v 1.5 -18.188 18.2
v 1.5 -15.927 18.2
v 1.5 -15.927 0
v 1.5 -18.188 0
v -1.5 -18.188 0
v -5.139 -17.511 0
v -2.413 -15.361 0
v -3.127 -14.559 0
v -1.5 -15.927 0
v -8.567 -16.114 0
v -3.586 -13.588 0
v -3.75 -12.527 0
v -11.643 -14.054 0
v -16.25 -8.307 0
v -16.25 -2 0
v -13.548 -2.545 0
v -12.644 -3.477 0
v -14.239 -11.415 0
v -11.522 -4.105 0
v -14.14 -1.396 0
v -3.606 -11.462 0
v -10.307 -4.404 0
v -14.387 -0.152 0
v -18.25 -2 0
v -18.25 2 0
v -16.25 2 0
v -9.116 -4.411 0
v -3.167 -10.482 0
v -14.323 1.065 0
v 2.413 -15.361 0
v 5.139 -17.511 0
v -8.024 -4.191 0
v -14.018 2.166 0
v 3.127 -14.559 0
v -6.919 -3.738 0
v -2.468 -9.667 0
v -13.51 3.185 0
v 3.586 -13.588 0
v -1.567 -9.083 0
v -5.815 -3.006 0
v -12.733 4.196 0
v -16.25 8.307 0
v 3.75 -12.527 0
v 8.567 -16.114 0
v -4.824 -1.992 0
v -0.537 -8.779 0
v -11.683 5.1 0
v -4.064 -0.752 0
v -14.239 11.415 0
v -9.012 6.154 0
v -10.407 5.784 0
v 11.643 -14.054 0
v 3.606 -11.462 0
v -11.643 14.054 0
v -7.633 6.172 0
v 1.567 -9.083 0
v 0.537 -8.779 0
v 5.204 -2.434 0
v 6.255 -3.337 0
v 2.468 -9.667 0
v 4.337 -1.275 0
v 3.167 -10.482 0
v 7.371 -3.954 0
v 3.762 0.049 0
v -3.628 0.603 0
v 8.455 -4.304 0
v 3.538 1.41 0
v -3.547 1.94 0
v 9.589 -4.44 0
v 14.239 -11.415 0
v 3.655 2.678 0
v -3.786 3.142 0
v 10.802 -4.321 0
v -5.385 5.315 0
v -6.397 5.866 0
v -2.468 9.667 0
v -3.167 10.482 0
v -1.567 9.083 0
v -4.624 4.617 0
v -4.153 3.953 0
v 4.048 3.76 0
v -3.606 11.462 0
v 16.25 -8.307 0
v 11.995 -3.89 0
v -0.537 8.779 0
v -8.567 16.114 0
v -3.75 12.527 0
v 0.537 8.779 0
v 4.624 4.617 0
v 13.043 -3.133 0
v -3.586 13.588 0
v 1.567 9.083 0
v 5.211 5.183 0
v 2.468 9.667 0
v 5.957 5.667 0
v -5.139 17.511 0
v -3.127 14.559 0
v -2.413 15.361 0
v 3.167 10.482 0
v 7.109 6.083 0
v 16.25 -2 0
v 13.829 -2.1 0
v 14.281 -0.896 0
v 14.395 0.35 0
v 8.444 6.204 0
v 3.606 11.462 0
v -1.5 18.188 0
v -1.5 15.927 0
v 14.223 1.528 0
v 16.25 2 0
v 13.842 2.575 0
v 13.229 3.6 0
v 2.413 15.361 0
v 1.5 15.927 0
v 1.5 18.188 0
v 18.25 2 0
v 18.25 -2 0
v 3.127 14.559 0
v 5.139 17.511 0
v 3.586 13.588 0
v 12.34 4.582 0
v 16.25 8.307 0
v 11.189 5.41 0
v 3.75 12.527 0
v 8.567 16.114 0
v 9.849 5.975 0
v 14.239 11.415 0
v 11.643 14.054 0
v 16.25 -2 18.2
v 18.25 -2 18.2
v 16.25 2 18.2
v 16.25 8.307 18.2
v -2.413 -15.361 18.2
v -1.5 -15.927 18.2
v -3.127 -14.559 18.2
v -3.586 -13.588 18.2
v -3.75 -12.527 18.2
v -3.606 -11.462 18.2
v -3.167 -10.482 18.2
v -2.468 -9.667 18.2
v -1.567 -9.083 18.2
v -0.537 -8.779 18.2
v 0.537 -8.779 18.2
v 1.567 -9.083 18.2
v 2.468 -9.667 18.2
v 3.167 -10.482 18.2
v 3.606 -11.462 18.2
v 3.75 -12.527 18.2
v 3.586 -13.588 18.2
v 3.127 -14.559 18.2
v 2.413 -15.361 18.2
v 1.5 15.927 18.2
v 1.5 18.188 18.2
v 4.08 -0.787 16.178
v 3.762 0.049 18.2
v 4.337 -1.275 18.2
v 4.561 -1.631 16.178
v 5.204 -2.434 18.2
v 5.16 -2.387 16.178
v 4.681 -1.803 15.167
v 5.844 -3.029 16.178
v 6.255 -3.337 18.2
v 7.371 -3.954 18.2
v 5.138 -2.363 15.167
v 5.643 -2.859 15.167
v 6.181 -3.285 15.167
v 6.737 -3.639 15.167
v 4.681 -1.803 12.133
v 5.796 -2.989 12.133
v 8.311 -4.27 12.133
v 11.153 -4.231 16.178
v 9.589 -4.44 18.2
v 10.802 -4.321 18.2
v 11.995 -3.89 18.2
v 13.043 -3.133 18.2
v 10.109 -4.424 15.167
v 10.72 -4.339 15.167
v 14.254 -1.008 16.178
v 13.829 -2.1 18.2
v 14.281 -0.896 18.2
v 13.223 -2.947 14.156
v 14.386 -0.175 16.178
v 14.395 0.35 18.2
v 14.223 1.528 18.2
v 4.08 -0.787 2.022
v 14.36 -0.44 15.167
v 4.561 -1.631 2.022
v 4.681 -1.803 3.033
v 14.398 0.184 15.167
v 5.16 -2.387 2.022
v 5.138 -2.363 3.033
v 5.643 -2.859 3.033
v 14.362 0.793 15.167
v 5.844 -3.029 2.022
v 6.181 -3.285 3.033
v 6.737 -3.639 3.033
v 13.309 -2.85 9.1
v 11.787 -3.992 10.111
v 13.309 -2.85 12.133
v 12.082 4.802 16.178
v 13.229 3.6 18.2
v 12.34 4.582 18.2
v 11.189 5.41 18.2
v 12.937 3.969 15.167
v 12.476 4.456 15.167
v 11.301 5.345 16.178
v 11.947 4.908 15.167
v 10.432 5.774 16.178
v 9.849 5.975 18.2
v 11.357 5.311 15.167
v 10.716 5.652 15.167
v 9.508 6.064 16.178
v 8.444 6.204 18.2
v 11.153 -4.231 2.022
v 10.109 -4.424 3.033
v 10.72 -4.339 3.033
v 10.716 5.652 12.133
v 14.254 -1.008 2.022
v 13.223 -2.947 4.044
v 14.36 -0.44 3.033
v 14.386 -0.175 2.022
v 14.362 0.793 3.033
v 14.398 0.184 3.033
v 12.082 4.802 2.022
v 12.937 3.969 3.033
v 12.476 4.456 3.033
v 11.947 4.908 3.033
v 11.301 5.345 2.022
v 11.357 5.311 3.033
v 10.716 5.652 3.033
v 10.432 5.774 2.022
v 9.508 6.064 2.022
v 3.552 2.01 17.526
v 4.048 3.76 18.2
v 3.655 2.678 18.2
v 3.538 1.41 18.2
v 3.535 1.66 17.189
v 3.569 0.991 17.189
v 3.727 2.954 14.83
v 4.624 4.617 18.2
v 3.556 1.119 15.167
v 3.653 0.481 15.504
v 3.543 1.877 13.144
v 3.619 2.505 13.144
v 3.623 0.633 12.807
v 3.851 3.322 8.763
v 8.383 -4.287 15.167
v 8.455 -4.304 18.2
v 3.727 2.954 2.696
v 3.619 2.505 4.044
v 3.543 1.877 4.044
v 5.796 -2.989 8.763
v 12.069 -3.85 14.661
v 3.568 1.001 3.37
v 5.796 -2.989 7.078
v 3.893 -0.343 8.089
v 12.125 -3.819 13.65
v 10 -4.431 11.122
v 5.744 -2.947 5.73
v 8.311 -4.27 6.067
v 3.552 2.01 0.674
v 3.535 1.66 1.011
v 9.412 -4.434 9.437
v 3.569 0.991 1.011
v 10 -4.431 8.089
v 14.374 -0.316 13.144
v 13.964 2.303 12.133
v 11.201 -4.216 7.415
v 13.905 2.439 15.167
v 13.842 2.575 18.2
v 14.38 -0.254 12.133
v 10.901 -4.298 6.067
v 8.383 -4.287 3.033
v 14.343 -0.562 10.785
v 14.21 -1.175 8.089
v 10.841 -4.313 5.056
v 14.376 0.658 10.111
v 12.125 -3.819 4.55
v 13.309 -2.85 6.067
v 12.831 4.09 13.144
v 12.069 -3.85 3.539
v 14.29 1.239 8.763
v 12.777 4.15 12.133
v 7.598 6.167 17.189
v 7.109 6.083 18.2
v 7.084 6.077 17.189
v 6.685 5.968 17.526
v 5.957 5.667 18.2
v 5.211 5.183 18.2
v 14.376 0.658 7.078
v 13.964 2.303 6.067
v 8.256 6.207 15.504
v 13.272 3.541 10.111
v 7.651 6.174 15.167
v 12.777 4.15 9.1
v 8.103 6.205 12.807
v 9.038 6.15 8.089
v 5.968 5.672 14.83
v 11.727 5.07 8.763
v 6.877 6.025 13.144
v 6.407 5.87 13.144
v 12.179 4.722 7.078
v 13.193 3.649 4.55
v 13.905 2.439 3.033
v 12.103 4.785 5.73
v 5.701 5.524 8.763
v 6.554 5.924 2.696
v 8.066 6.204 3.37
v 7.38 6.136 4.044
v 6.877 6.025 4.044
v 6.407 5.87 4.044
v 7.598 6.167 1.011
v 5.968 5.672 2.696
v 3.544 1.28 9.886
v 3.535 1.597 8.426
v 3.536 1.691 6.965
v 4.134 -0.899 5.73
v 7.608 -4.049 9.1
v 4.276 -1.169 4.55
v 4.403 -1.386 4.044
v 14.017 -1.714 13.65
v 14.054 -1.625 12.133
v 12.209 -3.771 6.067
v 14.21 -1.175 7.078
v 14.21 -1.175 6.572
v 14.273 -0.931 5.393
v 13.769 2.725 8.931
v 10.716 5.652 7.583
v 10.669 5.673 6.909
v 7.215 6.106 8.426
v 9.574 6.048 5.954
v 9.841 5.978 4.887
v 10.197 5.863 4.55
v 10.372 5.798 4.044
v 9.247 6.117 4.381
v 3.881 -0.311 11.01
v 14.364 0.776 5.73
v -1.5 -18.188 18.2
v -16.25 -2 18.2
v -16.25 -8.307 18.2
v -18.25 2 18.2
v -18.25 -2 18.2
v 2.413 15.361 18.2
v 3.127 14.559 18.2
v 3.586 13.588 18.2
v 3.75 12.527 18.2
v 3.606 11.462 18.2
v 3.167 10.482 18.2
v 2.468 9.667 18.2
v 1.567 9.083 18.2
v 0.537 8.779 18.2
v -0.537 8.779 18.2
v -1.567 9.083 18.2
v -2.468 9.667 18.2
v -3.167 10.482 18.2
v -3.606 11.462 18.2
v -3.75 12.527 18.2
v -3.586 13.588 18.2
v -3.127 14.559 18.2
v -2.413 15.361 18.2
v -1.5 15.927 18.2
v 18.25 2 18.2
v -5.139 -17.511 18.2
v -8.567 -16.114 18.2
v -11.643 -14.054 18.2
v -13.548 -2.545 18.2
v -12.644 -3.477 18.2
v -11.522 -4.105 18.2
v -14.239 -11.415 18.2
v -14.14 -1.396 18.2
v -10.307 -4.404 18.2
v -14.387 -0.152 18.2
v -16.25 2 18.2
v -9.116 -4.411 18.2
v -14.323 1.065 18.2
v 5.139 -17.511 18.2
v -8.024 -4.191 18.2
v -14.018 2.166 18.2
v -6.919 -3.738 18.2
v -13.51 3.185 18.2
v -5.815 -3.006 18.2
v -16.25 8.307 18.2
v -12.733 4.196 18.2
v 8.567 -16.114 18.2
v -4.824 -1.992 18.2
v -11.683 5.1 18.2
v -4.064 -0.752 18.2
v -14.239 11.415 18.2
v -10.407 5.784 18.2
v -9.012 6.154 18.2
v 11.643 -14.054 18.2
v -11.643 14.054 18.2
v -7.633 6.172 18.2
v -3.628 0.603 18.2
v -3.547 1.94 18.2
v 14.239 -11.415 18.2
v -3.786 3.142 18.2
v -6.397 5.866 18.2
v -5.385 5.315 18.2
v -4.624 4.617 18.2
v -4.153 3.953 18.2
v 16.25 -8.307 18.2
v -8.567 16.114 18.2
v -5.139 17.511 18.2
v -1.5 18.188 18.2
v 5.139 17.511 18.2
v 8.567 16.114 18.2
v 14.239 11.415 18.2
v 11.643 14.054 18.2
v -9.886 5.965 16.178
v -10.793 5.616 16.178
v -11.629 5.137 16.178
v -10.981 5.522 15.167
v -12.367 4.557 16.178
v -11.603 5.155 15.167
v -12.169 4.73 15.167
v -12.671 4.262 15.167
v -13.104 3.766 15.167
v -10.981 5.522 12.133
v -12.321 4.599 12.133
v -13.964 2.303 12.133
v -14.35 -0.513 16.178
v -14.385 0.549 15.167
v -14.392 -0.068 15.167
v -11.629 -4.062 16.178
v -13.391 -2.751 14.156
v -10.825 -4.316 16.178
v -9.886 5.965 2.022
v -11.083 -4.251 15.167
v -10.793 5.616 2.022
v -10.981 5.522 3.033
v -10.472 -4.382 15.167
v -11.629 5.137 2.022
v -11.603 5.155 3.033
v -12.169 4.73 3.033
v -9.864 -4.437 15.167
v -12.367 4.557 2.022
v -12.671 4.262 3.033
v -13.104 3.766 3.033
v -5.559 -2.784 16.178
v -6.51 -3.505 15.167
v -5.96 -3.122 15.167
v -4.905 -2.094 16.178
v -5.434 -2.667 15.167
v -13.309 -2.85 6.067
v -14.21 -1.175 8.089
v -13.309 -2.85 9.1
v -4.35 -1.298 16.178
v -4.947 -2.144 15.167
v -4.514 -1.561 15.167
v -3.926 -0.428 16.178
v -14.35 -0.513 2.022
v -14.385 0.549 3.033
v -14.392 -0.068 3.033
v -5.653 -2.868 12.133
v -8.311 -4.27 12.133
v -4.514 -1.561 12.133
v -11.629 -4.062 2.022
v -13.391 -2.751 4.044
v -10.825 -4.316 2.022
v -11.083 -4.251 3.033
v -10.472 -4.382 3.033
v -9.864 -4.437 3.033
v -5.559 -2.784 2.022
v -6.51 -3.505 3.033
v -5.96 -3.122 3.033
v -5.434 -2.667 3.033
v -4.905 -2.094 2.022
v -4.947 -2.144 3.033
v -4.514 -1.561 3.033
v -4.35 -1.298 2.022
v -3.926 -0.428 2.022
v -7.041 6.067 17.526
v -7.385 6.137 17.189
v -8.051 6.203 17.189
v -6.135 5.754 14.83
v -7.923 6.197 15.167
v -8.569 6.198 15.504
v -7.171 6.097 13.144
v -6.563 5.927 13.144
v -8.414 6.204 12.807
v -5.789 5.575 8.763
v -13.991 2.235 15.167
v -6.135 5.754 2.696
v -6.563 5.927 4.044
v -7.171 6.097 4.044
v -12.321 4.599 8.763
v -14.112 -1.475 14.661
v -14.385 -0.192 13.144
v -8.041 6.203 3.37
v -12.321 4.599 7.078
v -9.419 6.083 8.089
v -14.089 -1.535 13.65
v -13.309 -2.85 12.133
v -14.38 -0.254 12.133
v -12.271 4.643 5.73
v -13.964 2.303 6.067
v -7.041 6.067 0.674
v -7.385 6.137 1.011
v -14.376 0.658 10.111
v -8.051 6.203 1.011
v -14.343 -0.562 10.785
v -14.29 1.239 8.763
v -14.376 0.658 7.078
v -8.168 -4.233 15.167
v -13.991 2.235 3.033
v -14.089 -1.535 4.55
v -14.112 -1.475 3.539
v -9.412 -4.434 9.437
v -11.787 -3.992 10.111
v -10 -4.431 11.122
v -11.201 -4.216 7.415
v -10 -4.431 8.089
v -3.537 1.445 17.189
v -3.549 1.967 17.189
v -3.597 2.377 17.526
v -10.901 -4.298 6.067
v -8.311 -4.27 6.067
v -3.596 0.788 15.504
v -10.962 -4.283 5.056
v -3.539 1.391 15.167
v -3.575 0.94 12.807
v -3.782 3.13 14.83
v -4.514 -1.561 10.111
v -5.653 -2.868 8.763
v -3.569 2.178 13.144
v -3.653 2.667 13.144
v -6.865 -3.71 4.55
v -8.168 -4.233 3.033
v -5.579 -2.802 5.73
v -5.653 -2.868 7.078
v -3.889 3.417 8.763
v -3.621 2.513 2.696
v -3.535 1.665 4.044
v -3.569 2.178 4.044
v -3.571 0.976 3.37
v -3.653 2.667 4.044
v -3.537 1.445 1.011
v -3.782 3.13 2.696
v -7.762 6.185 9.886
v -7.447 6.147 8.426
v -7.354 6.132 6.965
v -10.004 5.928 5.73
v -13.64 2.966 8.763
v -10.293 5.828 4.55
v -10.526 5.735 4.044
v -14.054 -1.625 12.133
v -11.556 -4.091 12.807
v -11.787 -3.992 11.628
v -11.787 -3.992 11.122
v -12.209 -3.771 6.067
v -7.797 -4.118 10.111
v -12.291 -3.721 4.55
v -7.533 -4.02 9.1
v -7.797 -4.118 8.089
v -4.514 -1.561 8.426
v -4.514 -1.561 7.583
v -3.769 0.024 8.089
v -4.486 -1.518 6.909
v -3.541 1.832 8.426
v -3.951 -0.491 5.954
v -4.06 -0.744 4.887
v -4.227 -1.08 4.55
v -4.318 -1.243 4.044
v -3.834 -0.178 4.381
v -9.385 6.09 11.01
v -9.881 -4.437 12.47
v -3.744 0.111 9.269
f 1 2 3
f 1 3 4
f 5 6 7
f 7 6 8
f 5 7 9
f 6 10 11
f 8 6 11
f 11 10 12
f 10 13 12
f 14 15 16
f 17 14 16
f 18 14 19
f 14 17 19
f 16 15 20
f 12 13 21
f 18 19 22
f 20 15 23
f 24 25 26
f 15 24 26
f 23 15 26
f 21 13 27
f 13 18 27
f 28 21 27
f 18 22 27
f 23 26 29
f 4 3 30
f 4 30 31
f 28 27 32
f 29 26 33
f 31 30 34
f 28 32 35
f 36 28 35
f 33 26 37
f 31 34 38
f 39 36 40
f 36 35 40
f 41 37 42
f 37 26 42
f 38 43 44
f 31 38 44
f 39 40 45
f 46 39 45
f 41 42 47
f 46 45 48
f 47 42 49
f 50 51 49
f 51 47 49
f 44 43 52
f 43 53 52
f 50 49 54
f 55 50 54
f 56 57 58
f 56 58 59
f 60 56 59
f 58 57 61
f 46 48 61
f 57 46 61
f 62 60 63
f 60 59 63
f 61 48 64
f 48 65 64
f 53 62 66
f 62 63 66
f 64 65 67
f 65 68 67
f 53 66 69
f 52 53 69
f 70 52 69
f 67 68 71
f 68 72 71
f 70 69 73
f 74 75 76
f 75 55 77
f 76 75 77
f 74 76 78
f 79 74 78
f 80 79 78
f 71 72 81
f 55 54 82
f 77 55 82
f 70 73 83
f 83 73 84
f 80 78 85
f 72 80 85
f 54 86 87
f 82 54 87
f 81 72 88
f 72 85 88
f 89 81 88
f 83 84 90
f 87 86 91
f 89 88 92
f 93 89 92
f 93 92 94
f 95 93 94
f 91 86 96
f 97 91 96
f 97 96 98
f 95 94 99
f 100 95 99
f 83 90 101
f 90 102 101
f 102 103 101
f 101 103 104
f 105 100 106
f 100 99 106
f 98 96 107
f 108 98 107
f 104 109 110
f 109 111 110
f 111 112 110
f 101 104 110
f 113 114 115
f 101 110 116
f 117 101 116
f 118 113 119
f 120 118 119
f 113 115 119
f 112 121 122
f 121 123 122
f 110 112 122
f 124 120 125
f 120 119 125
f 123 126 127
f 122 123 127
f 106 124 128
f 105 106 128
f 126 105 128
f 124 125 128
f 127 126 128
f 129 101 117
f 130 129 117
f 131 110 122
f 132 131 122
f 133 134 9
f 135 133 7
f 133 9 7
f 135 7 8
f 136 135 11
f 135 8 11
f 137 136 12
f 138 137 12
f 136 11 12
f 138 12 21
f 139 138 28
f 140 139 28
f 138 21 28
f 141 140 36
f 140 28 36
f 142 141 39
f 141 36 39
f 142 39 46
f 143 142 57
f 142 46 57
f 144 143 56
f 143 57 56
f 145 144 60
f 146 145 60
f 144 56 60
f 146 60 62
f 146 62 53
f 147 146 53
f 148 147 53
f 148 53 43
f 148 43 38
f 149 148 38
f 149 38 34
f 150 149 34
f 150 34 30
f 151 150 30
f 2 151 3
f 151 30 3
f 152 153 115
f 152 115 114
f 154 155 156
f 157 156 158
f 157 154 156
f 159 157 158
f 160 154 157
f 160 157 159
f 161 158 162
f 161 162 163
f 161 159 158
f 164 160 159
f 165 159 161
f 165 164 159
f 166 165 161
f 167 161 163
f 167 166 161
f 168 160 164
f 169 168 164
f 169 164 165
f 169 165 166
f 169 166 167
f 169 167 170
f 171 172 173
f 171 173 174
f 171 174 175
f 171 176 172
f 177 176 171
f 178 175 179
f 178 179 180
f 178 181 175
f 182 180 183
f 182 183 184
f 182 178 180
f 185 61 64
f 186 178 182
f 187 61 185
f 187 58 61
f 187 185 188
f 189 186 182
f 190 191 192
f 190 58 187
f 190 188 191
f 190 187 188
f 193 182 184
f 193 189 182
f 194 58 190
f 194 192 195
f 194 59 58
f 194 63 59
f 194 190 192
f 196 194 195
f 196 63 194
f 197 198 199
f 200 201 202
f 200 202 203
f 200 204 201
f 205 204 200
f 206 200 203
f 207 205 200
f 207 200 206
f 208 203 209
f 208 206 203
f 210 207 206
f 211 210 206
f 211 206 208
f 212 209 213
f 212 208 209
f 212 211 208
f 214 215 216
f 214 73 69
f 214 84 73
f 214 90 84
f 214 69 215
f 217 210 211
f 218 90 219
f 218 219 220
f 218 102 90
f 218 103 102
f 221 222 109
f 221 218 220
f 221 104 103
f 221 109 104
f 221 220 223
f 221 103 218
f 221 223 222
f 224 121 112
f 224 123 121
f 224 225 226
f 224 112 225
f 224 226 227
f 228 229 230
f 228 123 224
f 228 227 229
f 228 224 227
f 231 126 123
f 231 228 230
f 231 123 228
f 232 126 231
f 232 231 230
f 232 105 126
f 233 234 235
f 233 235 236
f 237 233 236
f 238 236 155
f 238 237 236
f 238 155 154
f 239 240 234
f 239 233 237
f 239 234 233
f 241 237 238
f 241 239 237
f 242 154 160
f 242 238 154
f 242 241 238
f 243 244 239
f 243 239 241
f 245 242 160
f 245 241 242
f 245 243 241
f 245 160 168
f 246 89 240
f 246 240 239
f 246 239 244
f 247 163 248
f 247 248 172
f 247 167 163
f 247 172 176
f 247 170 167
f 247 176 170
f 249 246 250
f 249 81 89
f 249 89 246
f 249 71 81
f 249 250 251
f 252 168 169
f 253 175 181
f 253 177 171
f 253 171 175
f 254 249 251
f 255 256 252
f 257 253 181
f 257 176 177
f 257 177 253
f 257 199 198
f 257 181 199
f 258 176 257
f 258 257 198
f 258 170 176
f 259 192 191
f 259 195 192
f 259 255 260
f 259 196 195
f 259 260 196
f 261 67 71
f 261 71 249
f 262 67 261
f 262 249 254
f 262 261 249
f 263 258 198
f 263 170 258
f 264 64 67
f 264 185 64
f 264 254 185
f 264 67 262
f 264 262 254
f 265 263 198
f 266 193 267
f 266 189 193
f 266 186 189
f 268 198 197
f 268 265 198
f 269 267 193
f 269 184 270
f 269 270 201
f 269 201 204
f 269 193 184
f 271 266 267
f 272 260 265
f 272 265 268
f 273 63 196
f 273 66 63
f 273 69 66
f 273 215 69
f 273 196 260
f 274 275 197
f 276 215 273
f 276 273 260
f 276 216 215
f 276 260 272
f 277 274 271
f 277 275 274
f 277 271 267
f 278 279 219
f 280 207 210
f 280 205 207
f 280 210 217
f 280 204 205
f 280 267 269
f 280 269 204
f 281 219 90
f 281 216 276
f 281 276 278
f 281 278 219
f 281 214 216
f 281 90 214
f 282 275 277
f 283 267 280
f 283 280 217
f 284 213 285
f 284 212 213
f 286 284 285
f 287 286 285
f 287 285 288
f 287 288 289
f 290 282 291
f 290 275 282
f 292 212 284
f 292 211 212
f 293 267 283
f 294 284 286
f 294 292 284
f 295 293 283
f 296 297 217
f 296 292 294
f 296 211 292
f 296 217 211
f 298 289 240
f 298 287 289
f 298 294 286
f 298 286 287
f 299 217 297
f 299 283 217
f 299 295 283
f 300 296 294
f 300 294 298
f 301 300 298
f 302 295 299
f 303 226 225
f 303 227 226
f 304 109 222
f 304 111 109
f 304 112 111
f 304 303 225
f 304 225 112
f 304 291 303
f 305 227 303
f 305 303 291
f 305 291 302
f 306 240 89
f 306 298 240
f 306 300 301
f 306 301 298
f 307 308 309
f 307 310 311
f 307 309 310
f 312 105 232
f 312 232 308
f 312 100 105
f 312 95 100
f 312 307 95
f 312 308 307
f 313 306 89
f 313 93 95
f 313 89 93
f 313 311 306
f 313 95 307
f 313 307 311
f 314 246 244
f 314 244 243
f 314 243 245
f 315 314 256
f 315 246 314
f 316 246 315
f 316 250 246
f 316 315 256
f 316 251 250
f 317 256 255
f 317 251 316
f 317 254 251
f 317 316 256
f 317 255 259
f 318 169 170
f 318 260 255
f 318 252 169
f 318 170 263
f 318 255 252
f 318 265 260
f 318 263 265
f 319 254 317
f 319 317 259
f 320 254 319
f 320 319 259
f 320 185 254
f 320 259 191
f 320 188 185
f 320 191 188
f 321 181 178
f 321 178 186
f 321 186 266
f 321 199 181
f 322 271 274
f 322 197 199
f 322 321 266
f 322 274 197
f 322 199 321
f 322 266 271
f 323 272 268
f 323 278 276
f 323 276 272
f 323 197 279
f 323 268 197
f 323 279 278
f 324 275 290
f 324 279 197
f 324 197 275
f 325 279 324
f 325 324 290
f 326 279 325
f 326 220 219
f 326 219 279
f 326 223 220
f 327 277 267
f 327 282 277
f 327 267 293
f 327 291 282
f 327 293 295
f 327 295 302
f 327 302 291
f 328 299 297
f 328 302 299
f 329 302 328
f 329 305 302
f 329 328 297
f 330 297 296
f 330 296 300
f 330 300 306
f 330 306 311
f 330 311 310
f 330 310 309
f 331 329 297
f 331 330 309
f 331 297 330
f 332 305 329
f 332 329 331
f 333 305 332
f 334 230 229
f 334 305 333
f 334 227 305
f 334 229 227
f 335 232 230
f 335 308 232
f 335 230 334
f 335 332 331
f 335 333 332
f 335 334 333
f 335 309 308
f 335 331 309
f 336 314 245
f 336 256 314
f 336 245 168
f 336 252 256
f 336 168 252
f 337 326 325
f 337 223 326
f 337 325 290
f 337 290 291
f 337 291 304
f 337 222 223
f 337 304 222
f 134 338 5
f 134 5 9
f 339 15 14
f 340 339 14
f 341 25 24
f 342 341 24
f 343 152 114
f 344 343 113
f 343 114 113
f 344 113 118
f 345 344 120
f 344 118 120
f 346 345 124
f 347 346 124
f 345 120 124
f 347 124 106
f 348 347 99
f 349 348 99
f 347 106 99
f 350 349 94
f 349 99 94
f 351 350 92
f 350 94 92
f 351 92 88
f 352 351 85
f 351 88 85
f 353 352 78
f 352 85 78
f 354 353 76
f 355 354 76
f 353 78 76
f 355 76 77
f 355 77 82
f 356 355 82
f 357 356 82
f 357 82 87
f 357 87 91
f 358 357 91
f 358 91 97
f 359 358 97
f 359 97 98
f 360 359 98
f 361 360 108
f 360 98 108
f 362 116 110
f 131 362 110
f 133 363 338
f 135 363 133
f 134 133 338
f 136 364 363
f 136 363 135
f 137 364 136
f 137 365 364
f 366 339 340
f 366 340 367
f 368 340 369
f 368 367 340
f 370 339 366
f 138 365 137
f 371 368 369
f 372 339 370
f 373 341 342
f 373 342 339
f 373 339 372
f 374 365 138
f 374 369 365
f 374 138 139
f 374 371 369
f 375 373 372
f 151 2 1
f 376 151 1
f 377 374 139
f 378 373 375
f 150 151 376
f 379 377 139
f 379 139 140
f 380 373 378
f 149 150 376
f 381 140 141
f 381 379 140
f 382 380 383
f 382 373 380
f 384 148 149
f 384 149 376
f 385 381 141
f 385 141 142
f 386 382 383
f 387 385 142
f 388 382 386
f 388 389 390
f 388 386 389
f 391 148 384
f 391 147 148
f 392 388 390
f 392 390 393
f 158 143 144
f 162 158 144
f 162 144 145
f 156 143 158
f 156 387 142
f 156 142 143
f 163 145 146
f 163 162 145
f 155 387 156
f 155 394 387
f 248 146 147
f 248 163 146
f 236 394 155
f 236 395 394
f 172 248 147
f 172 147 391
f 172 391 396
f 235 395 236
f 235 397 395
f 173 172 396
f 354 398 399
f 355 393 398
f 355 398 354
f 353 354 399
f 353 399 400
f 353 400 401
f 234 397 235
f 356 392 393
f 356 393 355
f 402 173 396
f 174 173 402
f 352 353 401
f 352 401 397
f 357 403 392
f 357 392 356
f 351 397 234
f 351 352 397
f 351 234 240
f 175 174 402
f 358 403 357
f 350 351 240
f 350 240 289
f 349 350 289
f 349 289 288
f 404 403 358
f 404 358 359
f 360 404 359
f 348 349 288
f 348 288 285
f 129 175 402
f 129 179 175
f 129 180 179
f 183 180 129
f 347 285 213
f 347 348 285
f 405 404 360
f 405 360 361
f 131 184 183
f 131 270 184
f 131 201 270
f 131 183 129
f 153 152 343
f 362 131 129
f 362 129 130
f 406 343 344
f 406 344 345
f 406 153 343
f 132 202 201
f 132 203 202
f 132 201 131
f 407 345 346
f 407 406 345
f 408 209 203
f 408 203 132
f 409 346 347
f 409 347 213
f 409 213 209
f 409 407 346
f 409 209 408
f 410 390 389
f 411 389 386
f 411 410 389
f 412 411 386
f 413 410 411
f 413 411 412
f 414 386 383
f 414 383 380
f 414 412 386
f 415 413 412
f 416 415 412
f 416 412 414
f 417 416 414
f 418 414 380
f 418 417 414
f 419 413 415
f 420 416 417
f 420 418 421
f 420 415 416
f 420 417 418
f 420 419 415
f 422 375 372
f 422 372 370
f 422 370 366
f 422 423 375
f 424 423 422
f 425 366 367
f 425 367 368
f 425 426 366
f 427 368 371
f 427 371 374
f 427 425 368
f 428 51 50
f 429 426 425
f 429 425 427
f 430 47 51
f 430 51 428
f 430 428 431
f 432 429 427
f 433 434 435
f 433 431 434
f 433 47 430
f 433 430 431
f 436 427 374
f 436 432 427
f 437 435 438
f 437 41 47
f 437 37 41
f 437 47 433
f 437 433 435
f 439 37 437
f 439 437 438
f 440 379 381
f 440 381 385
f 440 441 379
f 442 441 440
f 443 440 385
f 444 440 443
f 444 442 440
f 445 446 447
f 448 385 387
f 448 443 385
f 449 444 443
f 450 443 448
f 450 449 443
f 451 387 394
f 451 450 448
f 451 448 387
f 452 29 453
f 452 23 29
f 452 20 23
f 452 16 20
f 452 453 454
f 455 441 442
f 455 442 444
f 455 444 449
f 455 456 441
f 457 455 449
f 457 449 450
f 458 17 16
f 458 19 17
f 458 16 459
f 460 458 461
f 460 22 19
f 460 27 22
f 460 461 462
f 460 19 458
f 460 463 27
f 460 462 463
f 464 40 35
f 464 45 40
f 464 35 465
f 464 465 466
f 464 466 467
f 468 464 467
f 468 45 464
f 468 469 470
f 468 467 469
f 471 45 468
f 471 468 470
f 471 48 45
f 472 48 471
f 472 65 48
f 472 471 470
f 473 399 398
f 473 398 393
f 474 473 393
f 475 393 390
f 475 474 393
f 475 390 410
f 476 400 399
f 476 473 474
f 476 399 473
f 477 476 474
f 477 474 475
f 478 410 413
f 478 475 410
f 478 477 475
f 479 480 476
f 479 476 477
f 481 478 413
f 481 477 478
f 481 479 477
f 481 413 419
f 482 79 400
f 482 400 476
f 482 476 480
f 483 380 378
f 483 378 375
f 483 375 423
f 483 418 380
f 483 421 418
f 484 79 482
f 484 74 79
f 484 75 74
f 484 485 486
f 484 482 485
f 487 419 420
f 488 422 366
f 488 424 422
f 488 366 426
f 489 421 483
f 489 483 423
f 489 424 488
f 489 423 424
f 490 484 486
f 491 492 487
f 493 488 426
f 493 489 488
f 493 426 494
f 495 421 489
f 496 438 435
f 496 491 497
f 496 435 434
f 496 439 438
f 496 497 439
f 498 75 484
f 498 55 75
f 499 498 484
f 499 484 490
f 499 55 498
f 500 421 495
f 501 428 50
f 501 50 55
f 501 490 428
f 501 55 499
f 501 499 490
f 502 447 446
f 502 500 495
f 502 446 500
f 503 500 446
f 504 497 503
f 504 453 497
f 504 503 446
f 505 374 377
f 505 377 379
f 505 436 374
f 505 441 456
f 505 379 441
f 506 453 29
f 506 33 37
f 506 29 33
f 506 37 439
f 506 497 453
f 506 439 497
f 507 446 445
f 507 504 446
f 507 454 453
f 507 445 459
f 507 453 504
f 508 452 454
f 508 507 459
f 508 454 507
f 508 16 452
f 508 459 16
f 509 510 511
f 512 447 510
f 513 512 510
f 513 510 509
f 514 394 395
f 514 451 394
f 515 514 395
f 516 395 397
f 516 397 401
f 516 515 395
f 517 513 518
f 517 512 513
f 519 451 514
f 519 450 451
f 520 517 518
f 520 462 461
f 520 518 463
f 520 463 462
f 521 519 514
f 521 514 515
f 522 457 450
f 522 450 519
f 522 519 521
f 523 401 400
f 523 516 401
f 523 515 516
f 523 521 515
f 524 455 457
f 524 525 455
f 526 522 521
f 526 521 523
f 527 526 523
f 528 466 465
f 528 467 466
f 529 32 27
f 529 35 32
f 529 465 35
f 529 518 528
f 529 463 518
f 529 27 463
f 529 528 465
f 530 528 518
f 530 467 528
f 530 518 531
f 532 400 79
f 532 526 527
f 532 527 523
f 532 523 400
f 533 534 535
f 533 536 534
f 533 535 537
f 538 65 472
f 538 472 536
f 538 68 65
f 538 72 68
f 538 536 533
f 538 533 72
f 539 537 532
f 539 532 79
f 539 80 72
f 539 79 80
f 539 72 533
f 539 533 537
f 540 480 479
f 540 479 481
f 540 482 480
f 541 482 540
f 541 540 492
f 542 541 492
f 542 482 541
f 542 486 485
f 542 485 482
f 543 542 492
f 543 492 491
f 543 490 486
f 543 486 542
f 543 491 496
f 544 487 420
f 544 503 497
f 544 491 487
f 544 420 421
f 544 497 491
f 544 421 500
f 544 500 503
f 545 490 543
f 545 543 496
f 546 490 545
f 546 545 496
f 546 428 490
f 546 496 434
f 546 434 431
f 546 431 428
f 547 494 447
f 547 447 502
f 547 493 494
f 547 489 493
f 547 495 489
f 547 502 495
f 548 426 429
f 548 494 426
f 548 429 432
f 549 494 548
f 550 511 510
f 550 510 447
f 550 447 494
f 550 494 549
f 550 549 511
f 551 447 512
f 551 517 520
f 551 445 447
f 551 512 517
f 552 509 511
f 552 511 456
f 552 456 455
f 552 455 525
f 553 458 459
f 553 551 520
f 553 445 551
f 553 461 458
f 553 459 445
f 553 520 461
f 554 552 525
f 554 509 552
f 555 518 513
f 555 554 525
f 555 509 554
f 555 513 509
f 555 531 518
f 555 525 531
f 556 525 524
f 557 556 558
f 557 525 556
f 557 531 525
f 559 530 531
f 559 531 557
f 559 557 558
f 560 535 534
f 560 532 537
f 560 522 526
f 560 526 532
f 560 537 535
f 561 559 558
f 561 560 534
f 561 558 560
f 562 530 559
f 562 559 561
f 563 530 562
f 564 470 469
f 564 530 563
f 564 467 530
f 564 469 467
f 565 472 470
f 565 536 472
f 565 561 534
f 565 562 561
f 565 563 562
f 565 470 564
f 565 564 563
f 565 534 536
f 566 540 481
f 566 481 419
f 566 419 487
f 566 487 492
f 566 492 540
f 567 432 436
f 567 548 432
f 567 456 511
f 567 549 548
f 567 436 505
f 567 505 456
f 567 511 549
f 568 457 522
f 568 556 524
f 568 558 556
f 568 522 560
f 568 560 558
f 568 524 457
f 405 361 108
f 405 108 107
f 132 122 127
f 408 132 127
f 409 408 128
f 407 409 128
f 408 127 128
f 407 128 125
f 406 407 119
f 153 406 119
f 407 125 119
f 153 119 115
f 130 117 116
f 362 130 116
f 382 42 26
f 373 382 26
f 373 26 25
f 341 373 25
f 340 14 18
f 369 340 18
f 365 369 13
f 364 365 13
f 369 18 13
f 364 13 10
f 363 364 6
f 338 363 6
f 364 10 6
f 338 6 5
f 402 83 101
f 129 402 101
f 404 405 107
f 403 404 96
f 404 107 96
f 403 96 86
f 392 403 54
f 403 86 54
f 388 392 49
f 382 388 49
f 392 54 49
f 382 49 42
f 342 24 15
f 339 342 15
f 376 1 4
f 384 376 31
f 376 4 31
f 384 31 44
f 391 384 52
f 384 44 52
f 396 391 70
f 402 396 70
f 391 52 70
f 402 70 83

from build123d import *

# Parameters (mm, degrees)
F1_DEPTH = 18.2


with BuildPart() as f1:
    # F0 (on Top) → F1 (new body)
    with BuildSketch(Plane.XY):
        with BuildLine():
            Line((16.25, 2), (16.25, 8.306624))
            ThreePointArc((16.25, 8.306624), (10.157621, 15.161967), (1.5, 18.188252))
            Line((1.5, 18.188252), (1.5, 15.926928))
            ThreePointArc((1.5, 15.926928), (0, 8.739996), (-1.5, 15.926928))
            Line((-1.5, 15.926928), (-1.5, 18.188252))
            ThreePointArc((-1.5, 18.188252), (-10.157621, 15.161967), (-16.25, 8.306624))
            Line((-16.25, 8.306624), (-16.25, 2))
            Line((-16.25, 2), (-18.25, 2))
            Line((-18.25, 2), (-18.25, 0))
            Line((-18.25, 0), (-18.25, -2))
            Line((-18.25, -2), (-16.25, -2))
            Line((-16.25, -2), (-16.25, -8.306624))
            ThreePointArc((-16.25, -8.306624), (-10.157621, -15.161967), (-1.5, -18.188252))
            Line((-1.5, -18.188252), (-1.5, -15.926928))
            ThreePointArc((-1.5, -15.926928), (0, -8.739996), (1.5, -15.926928))
            Line((1.5, -15.926928), (1.5, -18.188252))
            ThreePointArc((1.5, -18.188252), (10.157621, -15.161967), (16.25, -8.306624))
            Line((16.25, -8.306624), (16.25, -2))
            Line((16.25, -2), (18.25, -2))
            Line((18.25, -2), (18.25, 0))
            Line((18.25, 0), (18.25, 2))
            Line((18.25, 2), (16.25, 2))
        make_face()
        with BuildLine():
            add(Edge.make_bspline(
                [(-4.624377, 4.617039), (-10.276395, 11.189988), (-13.963516, 2.302933), (-17.650637, -6.584122), (-8.311498, -4.270016), (1.027641, -1.95591), (-4.624377, 4.617039)],
                knots=[0, 0, 0, 2.094395, 2.094395, 4.18879, 4.18879, 6.283185, 6.283185, 6.283185], degree=2, weights=[1, 0.5, 1, 0.5, 1, 0.5, 1]))
        make_face(mode=Mode.SUBTRACT)
        with BuildLine():
            add(Edge.make_bspline(
                [(4.624377, 4.617039), (-1.027641, -1.95591), (8.311498, -4.270016), (17.650637, -6.584122), (13.963516, 2.302933), (10.276395, 11.189988), (4.624377, 4.617039)],
                knots=[0, 0, 0, 2.094395, 2.094395, 4.18879, 4.18879, 6.283185, 6.283185, 6.283185], degree=2, weights=[1, 0.5, 1, 0.5, 1, 0.5, 1]))
        make_face(mode=Mode.SUBTRACT)
    extrude(amount=F1_DEPTH)


solid = f1.part
